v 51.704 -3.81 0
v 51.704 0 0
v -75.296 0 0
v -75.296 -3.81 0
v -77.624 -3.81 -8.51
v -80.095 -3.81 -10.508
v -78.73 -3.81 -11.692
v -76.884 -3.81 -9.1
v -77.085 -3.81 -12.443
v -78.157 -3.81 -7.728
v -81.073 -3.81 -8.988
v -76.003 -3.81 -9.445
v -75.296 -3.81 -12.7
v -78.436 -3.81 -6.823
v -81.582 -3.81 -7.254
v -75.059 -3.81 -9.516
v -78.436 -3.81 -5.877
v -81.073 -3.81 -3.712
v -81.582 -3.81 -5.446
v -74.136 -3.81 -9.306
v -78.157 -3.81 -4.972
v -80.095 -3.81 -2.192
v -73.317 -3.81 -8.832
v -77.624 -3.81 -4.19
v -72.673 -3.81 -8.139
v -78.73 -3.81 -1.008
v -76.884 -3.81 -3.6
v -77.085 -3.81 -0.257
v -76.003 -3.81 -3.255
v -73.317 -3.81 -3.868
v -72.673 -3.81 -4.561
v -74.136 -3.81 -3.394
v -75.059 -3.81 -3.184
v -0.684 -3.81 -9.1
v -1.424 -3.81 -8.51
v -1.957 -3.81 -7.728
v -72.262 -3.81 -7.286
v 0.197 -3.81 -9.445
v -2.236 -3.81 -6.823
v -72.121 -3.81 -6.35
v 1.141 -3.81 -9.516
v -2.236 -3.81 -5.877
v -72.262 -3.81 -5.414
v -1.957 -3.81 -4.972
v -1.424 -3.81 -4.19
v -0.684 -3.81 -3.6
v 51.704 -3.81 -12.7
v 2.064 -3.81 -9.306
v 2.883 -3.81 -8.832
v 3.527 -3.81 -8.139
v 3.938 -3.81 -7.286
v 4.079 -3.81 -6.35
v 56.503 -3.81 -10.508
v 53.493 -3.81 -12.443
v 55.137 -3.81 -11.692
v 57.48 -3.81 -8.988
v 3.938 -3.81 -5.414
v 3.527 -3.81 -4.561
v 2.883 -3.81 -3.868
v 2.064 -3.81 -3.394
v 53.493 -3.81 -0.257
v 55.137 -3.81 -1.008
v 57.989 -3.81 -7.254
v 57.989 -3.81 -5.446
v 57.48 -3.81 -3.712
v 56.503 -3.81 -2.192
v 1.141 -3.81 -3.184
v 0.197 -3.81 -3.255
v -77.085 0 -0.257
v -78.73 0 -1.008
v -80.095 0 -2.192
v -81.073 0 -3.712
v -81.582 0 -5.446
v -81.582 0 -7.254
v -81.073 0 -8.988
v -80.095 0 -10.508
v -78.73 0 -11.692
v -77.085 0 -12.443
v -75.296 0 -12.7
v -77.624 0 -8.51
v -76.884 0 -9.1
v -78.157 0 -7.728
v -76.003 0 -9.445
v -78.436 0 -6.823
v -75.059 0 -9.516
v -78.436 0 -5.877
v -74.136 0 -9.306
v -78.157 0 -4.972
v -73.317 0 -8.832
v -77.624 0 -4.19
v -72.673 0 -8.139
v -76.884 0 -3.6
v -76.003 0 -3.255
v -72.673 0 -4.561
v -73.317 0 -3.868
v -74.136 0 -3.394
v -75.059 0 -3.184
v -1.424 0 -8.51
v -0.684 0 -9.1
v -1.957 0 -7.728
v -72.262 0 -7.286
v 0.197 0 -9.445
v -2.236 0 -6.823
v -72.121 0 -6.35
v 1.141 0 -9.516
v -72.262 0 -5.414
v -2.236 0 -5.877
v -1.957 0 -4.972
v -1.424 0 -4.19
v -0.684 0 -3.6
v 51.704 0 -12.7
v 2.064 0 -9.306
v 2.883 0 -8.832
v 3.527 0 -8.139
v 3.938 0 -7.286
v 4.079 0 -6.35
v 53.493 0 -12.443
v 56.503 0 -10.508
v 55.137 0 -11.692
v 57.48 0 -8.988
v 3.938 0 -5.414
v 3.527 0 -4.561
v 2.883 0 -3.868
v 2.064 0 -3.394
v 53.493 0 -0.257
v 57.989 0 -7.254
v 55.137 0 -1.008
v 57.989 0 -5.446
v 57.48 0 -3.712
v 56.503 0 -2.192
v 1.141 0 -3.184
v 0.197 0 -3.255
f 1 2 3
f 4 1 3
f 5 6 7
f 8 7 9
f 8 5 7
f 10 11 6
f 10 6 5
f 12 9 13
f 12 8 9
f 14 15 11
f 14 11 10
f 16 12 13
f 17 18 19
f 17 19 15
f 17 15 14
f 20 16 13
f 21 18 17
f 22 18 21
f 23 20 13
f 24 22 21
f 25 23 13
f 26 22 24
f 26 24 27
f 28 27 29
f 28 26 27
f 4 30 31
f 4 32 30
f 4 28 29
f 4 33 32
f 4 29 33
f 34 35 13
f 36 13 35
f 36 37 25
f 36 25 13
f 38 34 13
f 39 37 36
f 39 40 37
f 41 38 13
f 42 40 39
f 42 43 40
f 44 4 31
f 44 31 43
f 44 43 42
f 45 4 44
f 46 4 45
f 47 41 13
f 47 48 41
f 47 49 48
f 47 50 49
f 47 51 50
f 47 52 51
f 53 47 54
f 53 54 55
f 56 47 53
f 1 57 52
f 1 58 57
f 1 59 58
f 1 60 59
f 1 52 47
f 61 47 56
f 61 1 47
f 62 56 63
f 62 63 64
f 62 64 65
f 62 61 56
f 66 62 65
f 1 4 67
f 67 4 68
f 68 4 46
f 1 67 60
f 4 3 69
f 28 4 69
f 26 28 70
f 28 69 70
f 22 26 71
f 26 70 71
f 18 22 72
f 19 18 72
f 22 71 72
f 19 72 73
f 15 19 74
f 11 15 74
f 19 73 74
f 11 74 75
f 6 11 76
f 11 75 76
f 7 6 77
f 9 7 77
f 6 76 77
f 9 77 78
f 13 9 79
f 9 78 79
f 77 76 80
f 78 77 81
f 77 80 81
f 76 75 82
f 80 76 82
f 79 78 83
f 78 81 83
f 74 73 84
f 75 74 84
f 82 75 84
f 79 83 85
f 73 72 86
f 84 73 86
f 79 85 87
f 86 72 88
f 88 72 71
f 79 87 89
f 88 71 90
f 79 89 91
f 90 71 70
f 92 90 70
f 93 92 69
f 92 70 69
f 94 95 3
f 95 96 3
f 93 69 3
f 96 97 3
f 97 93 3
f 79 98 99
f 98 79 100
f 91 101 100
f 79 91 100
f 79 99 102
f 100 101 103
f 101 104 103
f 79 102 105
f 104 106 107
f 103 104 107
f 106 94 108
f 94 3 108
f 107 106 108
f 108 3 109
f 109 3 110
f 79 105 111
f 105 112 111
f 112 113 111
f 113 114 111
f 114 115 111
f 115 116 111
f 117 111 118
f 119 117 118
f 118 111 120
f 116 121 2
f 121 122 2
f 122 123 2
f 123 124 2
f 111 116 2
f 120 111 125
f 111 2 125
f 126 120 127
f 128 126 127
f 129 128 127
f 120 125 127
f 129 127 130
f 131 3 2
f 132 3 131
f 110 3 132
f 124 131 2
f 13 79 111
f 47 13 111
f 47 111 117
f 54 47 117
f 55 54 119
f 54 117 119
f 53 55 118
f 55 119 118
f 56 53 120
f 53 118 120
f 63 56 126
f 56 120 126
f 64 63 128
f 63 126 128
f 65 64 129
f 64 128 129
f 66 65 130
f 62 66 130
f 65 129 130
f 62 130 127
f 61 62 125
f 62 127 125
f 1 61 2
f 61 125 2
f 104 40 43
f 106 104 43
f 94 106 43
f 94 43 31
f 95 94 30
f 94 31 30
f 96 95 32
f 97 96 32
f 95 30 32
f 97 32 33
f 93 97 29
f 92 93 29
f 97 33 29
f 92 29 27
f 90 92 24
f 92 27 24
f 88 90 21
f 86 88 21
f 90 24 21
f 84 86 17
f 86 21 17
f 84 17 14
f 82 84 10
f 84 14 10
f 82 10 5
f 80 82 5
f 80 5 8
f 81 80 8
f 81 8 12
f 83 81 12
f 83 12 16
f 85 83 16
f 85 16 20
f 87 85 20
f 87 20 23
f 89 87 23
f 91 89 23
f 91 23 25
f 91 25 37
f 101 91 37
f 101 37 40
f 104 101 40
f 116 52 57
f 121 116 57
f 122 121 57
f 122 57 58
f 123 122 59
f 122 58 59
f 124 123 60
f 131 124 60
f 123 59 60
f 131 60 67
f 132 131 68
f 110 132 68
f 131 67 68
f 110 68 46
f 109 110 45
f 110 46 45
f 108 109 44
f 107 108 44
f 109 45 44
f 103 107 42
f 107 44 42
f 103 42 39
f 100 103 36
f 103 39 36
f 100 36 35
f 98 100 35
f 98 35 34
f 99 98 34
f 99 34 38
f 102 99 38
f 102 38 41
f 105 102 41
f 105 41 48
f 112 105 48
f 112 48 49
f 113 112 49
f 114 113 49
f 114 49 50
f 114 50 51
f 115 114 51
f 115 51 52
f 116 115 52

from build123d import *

# Parameters (mm, degrees)
F1_DEPTH = 3.81
F2_R     = 3.175
F3_DEPTH = 25.4


with BuildPart() as f1:
    # F0 (on Front) → F1 (new body)
    with BuildSketch(Plane.XZ):
        with BuildLine():
            Line((51.703557, 0), (-75.296443, 0))
            ThreePointArc((-75.296443, 0), (-81.646443, -6.35), (-75.296443, -12.7))
            Line((-75.296443, -12.7), (51.703557, -12.7))
            ThreePointArc((51.703557, -12.7), (58.053557, -6.35), (51.703557, 0))
        make_face()
    extrude(amount=F1_DEPTH)

    # F2 (on face) → F3 (cut)
    with BuildSketch(Plane.XZ.offset(3.81)):
        with Locations((-75.296443, -6.35)):
            Circle(F2_R)
        with Locations((0.903557, -6.35)):
            Circle(F2_R)
    extrude(amount=-F3_DEPTH, mode=Mode.SUBTRACT)


solid = f1.part
